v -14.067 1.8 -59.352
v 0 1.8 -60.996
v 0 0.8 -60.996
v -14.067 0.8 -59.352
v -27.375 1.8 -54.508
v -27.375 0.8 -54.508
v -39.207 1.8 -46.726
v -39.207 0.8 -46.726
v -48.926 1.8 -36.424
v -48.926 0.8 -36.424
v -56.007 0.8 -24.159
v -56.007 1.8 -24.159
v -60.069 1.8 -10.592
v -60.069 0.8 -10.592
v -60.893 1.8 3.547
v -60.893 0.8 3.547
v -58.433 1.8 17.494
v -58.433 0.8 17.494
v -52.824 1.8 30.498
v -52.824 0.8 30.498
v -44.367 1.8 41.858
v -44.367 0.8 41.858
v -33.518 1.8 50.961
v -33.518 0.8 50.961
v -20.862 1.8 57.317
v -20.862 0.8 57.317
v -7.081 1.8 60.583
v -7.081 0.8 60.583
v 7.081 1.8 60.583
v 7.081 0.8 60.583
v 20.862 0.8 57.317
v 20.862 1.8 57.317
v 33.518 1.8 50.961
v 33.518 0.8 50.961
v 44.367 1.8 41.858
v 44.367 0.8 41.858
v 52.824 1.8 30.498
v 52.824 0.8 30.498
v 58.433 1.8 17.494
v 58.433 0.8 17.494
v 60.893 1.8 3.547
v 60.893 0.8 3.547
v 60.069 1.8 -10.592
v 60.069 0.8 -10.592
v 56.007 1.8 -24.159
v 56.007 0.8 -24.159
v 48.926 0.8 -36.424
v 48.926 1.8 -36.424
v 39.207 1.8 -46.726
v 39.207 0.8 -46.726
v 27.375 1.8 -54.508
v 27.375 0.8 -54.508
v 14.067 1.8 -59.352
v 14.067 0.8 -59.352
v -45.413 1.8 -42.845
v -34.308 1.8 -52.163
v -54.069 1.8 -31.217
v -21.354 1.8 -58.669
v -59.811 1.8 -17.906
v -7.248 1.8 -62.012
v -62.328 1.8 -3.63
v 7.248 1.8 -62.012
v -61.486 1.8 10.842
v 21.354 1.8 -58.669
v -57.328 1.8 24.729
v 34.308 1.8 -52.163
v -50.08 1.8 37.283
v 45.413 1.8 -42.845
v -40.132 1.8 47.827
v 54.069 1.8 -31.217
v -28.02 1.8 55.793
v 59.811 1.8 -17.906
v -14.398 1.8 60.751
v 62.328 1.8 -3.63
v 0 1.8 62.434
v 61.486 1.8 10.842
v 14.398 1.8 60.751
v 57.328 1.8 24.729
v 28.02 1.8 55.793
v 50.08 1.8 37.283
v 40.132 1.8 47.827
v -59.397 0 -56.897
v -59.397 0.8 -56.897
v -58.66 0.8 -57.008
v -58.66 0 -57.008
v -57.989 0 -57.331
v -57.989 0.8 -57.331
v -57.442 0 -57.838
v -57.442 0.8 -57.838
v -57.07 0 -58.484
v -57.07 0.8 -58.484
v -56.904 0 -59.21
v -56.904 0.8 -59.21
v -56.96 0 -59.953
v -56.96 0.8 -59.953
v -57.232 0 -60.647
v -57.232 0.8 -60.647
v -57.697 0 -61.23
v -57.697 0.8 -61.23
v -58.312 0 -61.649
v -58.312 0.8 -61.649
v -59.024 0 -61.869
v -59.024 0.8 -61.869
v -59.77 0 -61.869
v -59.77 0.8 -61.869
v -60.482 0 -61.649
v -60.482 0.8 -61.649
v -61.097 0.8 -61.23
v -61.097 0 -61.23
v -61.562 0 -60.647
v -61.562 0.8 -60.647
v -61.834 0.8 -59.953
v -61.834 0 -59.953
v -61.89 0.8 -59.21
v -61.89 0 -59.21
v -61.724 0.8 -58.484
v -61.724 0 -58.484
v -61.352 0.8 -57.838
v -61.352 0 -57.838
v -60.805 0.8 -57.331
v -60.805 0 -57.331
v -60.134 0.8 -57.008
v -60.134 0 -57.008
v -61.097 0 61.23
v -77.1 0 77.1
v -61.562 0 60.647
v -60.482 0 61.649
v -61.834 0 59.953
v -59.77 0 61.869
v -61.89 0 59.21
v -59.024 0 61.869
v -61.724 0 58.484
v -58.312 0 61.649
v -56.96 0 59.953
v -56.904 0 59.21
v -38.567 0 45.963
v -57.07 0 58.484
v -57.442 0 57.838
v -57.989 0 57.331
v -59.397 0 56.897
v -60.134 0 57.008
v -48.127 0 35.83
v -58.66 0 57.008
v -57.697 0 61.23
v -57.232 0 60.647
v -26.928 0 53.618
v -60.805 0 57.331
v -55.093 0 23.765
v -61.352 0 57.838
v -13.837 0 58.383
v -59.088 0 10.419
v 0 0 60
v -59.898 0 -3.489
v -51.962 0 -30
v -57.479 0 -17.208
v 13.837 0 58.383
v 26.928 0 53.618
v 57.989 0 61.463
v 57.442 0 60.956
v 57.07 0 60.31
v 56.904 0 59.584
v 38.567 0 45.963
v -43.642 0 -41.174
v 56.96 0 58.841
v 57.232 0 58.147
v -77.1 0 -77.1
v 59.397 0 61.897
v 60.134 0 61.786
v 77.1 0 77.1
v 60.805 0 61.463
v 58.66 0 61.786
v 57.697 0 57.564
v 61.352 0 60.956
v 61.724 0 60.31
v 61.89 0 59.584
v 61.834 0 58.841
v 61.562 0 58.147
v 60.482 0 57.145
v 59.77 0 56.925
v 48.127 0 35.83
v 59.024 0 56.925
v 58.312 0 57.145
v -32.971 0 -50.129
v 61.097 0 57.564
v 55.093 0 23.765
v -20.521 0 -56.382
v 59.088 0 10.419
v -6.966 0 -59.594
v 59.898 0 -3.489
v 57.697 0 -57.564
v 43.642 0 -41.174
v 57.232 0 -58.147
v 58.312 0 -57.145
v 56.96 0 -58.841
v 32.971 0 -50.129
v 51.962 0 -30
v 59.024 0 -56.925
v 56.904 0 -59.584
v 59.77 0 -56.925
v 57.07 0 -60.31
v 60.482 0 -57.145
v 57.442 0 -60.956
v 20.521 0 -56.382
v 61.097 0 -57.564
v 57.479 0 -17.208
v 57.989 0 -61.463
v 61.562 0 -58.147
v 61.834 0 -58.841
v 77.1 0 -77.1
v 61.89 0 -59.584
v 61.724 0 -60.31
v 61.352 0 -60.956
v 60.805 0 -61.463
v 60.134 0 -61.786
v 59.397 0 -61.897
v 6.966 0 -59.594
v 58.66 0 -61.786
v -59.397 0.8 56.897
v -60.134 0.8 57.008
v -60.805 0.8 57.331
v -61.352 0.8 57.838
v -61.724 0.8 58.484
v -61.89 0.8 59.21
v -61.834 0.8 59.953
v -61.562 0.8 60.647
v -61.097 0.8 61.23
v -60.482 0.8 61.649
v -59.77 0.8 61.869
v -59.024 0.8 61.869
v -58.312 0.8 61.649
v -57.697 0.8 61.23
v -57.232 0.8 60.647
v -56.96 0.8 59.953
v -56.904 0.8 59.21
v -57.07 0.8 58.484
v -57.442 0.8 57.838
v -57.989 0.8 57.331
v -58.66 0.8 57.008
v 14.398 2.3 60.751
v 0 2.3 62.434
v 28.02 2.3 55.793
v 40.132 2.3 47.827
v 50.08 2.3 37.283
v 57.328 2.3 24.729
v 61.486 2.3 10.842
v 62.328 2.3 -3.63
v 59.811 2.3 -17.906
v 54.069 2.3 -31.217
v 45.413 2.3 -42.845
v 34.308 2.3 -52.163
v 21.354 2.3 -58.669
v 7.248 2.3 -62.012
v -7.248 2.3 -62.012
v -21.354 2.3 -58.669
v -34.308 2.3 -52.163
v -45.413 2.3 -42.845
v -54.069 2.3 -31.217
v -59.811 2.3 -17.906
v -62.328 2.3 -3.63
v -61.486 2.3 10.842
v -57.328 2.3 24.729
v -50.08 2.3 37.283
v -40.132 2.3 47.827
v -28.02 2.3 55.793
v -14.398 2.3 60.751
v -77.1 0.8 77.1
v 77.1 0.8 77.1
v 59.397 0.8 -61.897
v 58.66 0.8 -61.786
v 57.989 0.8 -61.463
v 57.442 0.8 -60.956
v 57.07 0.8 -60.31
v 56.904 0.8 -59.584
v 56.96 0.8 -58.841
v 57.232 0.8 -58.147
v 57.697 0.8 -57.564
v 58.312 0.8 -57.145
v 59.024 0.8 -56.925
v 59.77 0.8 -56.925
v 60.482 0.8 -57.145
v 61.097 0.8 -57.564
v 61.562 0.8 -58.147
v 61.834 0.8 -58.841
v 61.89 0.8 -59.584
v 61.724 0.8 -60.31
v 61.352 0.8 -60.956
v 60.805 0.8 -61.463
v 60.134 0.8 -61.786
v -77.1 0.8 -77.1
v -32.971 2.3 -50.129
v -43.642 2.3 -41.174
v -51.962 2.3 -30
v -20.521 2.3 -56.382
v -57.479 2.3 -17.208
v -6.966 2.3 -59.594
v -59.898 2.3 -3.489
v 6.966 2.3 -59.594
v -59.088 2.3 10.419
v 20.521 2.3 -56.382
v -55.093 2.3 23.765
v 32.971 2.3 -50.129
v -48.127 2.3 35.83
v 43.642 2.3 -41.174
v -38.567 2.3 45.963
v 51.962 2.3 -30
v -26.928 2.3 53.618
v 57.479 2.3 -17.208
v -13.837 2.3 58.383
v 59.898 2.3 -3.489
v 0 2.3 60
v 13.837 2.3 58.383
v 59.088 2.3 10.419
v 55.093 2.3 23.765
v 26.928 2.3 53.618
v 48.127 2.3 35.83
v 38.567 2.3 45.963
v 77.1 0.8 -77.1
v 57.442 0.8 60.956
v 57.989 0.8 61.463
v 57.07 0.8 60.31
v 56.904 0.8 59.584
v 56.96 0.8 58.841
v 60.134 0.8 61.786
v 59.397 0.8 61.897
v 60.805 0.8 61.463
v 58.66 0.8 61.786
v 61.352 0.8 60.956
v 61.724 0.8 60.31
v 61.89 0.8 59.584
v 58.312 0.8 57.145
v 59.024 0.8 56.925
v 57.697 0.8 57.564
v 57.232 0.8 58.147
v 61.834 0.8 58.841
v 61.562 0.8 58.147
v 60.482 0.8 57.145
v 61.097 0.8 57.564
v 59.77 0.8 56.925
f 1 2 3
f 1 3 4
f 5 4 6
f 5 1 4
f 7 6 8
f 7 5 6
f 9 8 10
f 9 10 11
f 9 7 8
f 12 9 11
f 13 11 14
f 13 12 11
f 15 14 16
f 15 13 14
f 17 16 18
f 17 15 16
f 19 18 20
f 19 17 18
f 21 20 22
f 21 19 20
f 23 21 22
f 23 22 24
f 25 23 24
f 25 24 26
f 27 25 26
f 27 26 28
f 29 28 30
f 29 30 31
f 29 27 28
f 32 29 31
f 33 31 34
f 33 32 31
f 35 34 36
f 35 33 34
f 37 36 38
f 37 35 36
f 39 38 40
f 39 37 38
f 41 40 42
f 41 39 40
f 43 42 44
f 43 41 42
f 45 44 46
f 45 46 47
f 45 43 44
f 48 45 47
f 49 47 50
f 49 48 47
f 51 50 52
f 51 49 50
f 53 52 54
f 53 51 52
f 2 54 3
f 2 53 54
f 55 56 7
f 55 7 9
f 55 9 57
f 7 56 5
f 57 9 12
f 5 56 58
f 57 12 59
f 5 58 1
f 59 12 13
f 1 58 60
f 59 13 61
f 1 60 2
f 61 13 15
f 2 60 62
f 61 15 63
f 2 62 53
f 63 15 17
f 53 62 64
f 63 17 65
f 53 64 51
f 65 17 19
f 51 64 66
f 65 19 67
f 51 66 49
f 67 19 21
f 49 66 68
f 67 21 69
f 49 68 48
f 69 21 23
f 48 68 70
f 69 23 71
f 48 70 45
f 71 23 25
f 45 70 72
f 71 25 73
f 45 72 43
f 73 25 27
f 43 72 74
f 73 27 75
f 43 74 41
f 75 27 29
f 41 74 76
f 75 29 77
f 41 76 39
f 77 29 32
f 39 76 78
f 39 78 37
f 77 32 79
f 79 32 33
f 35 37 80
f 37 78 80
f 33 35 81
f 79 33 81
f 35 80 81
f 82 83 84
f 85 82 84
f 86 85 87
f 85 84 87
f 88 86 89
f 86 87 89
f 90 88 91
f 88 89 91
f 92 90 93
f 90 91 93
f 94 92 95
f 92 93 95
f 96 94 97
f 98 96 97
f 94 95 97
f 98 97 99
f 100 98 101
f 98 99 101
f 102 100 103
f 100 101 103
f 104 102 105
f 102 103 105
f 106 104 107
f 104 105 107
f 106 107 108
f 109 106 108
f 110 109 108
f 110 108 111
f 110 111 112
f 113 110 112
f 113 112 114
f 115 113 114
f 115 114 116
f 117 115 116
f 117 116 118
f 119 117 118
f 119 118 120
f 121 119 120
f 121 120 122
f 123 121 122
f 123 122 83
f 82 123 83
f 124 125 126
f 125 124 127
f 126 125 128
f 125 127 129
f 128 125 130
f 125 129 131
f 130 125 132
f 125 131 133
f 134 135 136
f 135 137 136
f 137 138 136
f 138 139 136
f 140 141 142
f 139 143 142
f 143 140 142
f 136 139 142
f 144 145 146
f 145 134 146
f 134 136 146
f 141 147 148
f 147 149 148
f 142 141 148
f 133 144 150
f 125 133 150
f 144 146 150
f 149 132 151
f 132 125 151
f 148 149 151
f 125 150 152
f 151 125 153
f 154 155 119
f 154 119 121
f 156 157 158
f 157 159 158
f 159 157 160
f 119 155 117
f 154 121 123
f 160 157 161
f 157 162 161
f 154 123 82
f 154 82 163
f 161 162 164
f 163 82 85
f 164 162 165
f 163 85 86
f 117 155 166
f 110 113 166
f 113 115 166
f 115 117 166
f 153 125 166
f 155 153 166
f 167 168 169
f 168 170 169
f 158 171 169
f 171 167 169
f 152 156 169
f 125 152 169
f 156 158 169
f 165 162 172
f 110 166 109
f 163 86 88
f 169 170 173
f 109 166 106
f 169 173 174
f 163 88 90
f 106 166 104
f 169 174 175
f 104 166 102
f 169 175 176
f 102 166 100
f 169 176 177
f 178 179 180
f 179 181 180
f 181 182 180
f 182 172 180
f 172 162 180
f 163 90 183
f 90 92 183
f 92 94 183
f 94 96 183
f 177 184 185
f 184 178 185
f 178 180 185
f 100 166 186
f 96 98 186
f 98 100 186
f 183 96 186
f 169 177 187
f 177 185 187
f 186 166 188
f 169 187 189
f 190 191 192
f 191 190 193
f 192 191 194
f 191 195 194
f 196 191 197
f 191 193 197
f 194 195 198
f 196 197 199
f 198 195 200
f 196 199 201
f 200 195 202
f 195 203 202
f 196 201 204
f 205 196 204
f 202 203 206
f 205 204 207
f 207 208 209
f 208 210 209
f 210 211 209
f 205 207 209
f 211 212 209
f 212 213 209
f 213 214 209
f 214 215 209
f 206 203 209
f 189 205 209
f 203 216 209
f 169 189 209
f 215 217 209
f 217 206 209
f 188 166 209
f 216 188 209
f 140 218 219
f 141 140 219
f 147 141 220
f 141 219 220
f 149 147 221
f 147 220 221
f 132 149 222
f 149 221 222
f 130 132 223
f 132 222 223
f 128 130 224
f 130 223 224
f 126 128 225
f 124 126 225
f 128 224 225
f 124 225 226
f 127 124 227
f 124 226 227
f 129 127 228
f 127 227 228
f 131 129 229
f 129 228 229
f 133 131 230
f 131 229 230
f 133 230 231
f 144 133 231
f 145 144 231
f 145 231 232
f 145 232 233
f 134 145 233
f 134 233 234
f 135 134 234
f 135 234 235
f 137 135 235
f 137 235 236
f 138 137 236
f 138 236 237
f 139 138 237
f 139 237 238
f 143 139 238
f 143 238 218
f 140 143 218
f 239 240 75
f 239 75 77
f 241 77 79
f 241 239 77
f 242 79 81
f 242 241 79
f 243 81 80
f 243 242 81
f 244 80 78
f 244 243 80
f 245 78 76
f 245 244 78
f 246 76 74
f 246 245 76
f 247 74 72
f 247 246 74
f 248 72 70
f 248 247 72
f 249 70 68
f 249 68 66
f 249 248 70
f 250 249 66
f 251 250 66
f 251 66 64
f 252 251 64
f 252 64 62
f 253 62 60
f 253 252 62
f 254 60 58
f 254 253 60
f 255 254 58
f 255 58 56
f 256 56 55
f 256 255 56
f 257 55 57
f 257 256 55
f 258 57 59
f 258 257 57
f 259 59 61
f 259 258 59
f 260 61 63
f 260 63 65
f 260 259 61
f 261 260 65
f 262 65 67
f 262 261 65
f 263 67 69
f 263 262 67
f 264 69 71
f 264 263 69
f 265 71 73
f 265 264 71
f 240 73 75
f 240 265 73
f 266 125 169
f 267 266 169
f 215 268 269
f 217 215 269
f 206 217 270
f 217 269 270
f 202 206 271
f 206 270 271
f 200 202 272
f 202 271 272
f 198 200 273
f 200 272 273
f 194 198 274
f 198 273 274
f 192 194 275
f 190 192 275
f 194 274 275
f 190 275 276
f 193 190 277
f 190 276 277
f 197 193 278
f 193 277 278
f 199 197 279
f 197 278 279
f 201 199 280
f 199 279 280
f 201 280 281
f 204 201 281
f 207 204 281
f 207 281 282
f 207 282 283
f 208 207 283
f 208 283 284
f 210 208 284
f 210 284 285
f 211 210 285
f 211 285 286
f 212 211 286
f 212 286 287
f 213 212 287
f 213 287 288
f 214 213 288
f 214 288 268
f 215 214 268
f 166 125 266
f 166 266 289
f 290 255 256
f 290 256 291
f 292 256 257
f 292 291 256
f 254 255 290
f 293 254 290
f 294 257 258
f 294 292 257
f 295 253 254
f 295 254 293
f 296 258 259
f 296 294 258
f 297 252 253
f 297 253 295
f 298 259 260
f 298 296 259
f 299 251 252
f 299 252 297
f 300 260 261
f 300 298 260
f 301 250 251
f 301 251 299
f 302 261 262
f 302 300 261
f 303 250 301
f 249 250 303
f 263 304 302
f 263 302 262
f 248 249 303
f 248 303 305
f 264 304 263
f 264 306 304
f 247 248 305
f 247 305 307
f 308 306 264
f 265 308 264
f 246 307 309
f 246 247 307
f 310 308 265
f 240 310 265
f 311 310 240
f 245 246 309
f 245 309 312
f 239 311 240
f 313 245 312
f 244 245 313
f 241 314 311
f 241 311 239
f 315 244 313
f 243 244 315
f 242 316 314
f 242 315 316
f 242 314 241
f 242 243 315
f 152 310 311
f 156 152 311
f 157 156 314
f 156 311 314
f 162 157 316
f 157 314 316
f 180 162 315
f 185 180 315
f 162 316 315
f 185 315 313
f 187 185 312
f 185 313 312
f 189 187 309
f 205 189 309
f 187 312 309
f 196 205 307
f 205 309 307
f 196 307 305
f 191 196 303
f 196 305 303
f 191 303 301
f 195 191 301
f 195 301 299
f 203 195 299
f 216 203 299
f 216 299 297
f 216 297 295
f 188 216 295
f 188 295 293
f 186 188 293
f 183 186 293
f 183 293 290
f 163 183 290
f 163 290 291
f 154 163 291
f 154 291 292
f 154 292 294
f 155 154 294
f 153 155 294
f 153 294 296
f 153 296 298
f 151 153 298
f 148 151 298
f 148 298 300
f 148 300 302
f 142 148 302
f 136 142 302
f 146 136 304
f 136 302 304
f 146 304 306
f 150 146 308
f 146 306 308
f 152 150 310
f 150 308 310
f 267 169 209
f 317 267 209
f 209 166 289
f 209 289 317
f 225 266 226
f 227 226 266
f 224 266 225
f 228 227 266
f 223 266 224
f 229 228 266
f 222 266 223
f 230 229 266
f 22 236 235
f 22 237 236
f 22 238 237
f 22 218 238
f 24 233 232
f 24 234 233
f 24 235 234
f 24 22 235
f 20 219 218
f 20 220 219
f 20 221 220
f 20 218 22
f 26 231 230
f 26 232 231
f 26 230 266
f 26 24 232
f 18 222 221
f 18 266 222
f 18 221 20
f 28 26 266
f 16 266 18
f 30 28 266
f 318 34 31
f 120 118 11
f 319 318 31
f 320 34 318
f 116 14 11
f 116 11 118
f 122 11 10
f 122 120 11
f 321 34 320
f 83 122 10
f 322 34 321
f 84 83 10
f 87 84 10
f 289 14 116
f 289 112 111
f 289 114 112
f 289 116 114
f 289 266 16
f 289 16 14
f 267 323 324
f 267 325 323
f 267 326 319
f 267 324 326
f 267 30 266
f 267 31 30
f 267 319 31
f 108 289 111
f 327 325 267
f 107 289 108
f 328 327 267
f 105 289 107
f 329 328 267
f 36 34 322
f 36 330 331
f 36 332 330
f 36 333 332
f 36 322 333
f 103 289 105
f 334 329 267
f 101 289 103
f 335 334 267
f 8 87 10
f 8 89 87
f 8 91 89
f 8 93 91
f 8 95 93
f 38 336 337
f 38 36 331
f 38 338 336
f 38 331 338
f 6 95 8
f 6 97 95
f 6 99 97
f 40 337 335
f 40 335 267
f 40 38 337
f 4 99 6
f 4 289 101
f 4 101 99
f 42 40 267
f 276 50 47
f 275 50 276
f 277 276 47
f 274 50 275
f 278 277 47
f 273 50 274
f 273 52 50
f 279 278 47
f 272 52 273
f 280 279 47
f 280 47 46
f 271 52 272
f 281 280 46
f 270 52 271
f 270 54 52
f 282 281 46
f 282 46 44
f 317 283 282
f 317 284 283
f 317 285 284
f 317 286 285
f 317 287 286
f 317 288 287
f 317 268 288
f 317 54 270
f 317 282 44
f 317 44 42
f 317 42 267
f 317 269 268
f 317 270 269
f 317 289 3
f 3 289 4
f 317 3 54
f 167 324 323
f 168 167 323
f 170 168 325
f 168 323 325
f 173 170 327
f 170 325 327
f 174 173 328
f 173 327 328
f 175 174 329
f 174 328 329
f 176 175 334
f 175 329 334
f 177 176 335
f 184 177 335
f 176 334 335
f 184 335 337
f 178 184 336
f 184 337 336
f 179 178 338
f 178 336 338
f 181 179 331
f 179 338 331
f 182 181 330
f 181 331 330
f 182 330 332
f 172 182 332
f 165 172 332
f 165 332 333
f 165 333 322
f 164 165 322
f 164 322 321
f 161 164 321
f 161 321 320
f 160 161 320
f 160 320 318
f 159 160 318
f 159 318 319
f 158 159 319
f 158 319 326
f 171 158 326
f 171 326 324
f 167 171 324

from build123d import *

# Parameters (mm, degrees)
CROQUIS1_W              = 154.2
CROQUIS1_H              = 154.2
SALIENTE_EXTRUIR1_DEPTH = 0.8
CROQUIS2_R              = 60
CORTAR_EXTRUIR1_DEPTH   = 110.038800434
SALIENTE_EXTRUIR2_START = 1
CROQUIS3_R              = 60.995810587
CROQUIS3_R_2            = 60
SALIENTE_EXTRUIR2_DEPTH = 1
SALIENTE_EXTRUIR3_START = 0.5
CROQUIS4_R              = 62.434019261
CROQUIS4_R_2            = 60
SALIENTE_EXTRUIR3_DEPTH = 0.5
CROQUIS5_R              = 2.5
CROQUIS5_R_2            = 60
CORTAR_EXTRUIR2_DEPTH   = 110.046182877


with BuildPart() as part:
    # Croquis1 → Saliente-Extruir1 (new body)
    with BuildSketch(Plane(origin=(0, 0, 0), x_dir=(1, 0, 0), z_dir=(0, 1, 0))):
        Rectangle(CROQUIS1_W, CROQUIS1_H)
    extrude(amount=SALIENTE_EXTRUIR1_DEPTH)

    # Croquis2 → Cortar-Extruir1 (cut, through all)
    with BuildSketch(Plane(origin=(0, 0.8, 0), x_dir=(1, 0, 0), z_dir=(0, 1, 0))):
        with Locations(Location((0, 0, 0), (0, 0, 270))):
            Circle(CROQUIS2_R)
    extrude(amount=-CORTAR_EXTRUIR1_DEPTH, mode=Mode.SUBTRACT)

    # Croquis3 → Saliente-Extruir2 (add)
    with BuildSketch(Plane(origin=(0, 0.8, 0), x_dir=(1, 0, 0), z_dir=(0, 1, 0)).offset(SALIENTE_EXTRUIR2_START)):
        with Locations(Location((0, 0, 0), (0, 0, 90))):
            Circle(CROQUIS3_R)
        with Locations(Location((0, 0, 0), (0, 0, 270))):
            Circle(CROQUIS3_R_2, mode=Mode.SUBTRACT)
    extrude(amount=-SALIENTE_EXTRUIR2_DEPTH)

    # Croquis4 → Saliente-Extruir3 (add)
    with BuildSketch(Plane(origin=(0, 1.8, 0), x_dir=(1, 0, 0), z_dir=(0, 1, 0)).offset(SALIENTE_EXTRUIR3_START)):
        with Locations(Location((0, 0, 0), (0, 0, 270))):
            Circle(CROQUIS4_R)
        with Locations(Location((0, 0, 0), (0, 0, 270))):
            Circle(CROQUIS4_R_2, mode=Mode.SUBTRACT)
    extrude(amount=-SALIENTE_EXTRUIR3_DEPTH)

    # Croquis5 → Cortar-Extruir2 (cut, through all)
    with BuildSketch(Plane(origin=(0, 0.8, 0), x_dir=(1, 0, 0), z_dir=(0, 1, 0))):
        with Locations(Location((-59.39696962, 59.39696962, 0), (0, 0, 270))):
            Circle(CROQUIS5_R)
        with Locations(Location((-59.39696962, -59.39696962, 0), (0, 0, 90))):
            Circle(CROQUIS5_R)
        with Locations(Location((59.39696962, -59.39696962, 0), (0, 0, 270))):
            Circle(CROQUIS5_R)
        with Locations(Location((0, 0, 0), (0, 0, 270))):
            Circle(CROQUIS5_R_2)
        with Locations(Location((59.39696962, 59.39696962, 0), (0, 0, 90))):
            Circle(CROQUIS5_R)
    extrude(amount=-CORTAR_EXTRUIR2_DEPTH, mode=Mode.SUBTRACT)


solid = part.part
